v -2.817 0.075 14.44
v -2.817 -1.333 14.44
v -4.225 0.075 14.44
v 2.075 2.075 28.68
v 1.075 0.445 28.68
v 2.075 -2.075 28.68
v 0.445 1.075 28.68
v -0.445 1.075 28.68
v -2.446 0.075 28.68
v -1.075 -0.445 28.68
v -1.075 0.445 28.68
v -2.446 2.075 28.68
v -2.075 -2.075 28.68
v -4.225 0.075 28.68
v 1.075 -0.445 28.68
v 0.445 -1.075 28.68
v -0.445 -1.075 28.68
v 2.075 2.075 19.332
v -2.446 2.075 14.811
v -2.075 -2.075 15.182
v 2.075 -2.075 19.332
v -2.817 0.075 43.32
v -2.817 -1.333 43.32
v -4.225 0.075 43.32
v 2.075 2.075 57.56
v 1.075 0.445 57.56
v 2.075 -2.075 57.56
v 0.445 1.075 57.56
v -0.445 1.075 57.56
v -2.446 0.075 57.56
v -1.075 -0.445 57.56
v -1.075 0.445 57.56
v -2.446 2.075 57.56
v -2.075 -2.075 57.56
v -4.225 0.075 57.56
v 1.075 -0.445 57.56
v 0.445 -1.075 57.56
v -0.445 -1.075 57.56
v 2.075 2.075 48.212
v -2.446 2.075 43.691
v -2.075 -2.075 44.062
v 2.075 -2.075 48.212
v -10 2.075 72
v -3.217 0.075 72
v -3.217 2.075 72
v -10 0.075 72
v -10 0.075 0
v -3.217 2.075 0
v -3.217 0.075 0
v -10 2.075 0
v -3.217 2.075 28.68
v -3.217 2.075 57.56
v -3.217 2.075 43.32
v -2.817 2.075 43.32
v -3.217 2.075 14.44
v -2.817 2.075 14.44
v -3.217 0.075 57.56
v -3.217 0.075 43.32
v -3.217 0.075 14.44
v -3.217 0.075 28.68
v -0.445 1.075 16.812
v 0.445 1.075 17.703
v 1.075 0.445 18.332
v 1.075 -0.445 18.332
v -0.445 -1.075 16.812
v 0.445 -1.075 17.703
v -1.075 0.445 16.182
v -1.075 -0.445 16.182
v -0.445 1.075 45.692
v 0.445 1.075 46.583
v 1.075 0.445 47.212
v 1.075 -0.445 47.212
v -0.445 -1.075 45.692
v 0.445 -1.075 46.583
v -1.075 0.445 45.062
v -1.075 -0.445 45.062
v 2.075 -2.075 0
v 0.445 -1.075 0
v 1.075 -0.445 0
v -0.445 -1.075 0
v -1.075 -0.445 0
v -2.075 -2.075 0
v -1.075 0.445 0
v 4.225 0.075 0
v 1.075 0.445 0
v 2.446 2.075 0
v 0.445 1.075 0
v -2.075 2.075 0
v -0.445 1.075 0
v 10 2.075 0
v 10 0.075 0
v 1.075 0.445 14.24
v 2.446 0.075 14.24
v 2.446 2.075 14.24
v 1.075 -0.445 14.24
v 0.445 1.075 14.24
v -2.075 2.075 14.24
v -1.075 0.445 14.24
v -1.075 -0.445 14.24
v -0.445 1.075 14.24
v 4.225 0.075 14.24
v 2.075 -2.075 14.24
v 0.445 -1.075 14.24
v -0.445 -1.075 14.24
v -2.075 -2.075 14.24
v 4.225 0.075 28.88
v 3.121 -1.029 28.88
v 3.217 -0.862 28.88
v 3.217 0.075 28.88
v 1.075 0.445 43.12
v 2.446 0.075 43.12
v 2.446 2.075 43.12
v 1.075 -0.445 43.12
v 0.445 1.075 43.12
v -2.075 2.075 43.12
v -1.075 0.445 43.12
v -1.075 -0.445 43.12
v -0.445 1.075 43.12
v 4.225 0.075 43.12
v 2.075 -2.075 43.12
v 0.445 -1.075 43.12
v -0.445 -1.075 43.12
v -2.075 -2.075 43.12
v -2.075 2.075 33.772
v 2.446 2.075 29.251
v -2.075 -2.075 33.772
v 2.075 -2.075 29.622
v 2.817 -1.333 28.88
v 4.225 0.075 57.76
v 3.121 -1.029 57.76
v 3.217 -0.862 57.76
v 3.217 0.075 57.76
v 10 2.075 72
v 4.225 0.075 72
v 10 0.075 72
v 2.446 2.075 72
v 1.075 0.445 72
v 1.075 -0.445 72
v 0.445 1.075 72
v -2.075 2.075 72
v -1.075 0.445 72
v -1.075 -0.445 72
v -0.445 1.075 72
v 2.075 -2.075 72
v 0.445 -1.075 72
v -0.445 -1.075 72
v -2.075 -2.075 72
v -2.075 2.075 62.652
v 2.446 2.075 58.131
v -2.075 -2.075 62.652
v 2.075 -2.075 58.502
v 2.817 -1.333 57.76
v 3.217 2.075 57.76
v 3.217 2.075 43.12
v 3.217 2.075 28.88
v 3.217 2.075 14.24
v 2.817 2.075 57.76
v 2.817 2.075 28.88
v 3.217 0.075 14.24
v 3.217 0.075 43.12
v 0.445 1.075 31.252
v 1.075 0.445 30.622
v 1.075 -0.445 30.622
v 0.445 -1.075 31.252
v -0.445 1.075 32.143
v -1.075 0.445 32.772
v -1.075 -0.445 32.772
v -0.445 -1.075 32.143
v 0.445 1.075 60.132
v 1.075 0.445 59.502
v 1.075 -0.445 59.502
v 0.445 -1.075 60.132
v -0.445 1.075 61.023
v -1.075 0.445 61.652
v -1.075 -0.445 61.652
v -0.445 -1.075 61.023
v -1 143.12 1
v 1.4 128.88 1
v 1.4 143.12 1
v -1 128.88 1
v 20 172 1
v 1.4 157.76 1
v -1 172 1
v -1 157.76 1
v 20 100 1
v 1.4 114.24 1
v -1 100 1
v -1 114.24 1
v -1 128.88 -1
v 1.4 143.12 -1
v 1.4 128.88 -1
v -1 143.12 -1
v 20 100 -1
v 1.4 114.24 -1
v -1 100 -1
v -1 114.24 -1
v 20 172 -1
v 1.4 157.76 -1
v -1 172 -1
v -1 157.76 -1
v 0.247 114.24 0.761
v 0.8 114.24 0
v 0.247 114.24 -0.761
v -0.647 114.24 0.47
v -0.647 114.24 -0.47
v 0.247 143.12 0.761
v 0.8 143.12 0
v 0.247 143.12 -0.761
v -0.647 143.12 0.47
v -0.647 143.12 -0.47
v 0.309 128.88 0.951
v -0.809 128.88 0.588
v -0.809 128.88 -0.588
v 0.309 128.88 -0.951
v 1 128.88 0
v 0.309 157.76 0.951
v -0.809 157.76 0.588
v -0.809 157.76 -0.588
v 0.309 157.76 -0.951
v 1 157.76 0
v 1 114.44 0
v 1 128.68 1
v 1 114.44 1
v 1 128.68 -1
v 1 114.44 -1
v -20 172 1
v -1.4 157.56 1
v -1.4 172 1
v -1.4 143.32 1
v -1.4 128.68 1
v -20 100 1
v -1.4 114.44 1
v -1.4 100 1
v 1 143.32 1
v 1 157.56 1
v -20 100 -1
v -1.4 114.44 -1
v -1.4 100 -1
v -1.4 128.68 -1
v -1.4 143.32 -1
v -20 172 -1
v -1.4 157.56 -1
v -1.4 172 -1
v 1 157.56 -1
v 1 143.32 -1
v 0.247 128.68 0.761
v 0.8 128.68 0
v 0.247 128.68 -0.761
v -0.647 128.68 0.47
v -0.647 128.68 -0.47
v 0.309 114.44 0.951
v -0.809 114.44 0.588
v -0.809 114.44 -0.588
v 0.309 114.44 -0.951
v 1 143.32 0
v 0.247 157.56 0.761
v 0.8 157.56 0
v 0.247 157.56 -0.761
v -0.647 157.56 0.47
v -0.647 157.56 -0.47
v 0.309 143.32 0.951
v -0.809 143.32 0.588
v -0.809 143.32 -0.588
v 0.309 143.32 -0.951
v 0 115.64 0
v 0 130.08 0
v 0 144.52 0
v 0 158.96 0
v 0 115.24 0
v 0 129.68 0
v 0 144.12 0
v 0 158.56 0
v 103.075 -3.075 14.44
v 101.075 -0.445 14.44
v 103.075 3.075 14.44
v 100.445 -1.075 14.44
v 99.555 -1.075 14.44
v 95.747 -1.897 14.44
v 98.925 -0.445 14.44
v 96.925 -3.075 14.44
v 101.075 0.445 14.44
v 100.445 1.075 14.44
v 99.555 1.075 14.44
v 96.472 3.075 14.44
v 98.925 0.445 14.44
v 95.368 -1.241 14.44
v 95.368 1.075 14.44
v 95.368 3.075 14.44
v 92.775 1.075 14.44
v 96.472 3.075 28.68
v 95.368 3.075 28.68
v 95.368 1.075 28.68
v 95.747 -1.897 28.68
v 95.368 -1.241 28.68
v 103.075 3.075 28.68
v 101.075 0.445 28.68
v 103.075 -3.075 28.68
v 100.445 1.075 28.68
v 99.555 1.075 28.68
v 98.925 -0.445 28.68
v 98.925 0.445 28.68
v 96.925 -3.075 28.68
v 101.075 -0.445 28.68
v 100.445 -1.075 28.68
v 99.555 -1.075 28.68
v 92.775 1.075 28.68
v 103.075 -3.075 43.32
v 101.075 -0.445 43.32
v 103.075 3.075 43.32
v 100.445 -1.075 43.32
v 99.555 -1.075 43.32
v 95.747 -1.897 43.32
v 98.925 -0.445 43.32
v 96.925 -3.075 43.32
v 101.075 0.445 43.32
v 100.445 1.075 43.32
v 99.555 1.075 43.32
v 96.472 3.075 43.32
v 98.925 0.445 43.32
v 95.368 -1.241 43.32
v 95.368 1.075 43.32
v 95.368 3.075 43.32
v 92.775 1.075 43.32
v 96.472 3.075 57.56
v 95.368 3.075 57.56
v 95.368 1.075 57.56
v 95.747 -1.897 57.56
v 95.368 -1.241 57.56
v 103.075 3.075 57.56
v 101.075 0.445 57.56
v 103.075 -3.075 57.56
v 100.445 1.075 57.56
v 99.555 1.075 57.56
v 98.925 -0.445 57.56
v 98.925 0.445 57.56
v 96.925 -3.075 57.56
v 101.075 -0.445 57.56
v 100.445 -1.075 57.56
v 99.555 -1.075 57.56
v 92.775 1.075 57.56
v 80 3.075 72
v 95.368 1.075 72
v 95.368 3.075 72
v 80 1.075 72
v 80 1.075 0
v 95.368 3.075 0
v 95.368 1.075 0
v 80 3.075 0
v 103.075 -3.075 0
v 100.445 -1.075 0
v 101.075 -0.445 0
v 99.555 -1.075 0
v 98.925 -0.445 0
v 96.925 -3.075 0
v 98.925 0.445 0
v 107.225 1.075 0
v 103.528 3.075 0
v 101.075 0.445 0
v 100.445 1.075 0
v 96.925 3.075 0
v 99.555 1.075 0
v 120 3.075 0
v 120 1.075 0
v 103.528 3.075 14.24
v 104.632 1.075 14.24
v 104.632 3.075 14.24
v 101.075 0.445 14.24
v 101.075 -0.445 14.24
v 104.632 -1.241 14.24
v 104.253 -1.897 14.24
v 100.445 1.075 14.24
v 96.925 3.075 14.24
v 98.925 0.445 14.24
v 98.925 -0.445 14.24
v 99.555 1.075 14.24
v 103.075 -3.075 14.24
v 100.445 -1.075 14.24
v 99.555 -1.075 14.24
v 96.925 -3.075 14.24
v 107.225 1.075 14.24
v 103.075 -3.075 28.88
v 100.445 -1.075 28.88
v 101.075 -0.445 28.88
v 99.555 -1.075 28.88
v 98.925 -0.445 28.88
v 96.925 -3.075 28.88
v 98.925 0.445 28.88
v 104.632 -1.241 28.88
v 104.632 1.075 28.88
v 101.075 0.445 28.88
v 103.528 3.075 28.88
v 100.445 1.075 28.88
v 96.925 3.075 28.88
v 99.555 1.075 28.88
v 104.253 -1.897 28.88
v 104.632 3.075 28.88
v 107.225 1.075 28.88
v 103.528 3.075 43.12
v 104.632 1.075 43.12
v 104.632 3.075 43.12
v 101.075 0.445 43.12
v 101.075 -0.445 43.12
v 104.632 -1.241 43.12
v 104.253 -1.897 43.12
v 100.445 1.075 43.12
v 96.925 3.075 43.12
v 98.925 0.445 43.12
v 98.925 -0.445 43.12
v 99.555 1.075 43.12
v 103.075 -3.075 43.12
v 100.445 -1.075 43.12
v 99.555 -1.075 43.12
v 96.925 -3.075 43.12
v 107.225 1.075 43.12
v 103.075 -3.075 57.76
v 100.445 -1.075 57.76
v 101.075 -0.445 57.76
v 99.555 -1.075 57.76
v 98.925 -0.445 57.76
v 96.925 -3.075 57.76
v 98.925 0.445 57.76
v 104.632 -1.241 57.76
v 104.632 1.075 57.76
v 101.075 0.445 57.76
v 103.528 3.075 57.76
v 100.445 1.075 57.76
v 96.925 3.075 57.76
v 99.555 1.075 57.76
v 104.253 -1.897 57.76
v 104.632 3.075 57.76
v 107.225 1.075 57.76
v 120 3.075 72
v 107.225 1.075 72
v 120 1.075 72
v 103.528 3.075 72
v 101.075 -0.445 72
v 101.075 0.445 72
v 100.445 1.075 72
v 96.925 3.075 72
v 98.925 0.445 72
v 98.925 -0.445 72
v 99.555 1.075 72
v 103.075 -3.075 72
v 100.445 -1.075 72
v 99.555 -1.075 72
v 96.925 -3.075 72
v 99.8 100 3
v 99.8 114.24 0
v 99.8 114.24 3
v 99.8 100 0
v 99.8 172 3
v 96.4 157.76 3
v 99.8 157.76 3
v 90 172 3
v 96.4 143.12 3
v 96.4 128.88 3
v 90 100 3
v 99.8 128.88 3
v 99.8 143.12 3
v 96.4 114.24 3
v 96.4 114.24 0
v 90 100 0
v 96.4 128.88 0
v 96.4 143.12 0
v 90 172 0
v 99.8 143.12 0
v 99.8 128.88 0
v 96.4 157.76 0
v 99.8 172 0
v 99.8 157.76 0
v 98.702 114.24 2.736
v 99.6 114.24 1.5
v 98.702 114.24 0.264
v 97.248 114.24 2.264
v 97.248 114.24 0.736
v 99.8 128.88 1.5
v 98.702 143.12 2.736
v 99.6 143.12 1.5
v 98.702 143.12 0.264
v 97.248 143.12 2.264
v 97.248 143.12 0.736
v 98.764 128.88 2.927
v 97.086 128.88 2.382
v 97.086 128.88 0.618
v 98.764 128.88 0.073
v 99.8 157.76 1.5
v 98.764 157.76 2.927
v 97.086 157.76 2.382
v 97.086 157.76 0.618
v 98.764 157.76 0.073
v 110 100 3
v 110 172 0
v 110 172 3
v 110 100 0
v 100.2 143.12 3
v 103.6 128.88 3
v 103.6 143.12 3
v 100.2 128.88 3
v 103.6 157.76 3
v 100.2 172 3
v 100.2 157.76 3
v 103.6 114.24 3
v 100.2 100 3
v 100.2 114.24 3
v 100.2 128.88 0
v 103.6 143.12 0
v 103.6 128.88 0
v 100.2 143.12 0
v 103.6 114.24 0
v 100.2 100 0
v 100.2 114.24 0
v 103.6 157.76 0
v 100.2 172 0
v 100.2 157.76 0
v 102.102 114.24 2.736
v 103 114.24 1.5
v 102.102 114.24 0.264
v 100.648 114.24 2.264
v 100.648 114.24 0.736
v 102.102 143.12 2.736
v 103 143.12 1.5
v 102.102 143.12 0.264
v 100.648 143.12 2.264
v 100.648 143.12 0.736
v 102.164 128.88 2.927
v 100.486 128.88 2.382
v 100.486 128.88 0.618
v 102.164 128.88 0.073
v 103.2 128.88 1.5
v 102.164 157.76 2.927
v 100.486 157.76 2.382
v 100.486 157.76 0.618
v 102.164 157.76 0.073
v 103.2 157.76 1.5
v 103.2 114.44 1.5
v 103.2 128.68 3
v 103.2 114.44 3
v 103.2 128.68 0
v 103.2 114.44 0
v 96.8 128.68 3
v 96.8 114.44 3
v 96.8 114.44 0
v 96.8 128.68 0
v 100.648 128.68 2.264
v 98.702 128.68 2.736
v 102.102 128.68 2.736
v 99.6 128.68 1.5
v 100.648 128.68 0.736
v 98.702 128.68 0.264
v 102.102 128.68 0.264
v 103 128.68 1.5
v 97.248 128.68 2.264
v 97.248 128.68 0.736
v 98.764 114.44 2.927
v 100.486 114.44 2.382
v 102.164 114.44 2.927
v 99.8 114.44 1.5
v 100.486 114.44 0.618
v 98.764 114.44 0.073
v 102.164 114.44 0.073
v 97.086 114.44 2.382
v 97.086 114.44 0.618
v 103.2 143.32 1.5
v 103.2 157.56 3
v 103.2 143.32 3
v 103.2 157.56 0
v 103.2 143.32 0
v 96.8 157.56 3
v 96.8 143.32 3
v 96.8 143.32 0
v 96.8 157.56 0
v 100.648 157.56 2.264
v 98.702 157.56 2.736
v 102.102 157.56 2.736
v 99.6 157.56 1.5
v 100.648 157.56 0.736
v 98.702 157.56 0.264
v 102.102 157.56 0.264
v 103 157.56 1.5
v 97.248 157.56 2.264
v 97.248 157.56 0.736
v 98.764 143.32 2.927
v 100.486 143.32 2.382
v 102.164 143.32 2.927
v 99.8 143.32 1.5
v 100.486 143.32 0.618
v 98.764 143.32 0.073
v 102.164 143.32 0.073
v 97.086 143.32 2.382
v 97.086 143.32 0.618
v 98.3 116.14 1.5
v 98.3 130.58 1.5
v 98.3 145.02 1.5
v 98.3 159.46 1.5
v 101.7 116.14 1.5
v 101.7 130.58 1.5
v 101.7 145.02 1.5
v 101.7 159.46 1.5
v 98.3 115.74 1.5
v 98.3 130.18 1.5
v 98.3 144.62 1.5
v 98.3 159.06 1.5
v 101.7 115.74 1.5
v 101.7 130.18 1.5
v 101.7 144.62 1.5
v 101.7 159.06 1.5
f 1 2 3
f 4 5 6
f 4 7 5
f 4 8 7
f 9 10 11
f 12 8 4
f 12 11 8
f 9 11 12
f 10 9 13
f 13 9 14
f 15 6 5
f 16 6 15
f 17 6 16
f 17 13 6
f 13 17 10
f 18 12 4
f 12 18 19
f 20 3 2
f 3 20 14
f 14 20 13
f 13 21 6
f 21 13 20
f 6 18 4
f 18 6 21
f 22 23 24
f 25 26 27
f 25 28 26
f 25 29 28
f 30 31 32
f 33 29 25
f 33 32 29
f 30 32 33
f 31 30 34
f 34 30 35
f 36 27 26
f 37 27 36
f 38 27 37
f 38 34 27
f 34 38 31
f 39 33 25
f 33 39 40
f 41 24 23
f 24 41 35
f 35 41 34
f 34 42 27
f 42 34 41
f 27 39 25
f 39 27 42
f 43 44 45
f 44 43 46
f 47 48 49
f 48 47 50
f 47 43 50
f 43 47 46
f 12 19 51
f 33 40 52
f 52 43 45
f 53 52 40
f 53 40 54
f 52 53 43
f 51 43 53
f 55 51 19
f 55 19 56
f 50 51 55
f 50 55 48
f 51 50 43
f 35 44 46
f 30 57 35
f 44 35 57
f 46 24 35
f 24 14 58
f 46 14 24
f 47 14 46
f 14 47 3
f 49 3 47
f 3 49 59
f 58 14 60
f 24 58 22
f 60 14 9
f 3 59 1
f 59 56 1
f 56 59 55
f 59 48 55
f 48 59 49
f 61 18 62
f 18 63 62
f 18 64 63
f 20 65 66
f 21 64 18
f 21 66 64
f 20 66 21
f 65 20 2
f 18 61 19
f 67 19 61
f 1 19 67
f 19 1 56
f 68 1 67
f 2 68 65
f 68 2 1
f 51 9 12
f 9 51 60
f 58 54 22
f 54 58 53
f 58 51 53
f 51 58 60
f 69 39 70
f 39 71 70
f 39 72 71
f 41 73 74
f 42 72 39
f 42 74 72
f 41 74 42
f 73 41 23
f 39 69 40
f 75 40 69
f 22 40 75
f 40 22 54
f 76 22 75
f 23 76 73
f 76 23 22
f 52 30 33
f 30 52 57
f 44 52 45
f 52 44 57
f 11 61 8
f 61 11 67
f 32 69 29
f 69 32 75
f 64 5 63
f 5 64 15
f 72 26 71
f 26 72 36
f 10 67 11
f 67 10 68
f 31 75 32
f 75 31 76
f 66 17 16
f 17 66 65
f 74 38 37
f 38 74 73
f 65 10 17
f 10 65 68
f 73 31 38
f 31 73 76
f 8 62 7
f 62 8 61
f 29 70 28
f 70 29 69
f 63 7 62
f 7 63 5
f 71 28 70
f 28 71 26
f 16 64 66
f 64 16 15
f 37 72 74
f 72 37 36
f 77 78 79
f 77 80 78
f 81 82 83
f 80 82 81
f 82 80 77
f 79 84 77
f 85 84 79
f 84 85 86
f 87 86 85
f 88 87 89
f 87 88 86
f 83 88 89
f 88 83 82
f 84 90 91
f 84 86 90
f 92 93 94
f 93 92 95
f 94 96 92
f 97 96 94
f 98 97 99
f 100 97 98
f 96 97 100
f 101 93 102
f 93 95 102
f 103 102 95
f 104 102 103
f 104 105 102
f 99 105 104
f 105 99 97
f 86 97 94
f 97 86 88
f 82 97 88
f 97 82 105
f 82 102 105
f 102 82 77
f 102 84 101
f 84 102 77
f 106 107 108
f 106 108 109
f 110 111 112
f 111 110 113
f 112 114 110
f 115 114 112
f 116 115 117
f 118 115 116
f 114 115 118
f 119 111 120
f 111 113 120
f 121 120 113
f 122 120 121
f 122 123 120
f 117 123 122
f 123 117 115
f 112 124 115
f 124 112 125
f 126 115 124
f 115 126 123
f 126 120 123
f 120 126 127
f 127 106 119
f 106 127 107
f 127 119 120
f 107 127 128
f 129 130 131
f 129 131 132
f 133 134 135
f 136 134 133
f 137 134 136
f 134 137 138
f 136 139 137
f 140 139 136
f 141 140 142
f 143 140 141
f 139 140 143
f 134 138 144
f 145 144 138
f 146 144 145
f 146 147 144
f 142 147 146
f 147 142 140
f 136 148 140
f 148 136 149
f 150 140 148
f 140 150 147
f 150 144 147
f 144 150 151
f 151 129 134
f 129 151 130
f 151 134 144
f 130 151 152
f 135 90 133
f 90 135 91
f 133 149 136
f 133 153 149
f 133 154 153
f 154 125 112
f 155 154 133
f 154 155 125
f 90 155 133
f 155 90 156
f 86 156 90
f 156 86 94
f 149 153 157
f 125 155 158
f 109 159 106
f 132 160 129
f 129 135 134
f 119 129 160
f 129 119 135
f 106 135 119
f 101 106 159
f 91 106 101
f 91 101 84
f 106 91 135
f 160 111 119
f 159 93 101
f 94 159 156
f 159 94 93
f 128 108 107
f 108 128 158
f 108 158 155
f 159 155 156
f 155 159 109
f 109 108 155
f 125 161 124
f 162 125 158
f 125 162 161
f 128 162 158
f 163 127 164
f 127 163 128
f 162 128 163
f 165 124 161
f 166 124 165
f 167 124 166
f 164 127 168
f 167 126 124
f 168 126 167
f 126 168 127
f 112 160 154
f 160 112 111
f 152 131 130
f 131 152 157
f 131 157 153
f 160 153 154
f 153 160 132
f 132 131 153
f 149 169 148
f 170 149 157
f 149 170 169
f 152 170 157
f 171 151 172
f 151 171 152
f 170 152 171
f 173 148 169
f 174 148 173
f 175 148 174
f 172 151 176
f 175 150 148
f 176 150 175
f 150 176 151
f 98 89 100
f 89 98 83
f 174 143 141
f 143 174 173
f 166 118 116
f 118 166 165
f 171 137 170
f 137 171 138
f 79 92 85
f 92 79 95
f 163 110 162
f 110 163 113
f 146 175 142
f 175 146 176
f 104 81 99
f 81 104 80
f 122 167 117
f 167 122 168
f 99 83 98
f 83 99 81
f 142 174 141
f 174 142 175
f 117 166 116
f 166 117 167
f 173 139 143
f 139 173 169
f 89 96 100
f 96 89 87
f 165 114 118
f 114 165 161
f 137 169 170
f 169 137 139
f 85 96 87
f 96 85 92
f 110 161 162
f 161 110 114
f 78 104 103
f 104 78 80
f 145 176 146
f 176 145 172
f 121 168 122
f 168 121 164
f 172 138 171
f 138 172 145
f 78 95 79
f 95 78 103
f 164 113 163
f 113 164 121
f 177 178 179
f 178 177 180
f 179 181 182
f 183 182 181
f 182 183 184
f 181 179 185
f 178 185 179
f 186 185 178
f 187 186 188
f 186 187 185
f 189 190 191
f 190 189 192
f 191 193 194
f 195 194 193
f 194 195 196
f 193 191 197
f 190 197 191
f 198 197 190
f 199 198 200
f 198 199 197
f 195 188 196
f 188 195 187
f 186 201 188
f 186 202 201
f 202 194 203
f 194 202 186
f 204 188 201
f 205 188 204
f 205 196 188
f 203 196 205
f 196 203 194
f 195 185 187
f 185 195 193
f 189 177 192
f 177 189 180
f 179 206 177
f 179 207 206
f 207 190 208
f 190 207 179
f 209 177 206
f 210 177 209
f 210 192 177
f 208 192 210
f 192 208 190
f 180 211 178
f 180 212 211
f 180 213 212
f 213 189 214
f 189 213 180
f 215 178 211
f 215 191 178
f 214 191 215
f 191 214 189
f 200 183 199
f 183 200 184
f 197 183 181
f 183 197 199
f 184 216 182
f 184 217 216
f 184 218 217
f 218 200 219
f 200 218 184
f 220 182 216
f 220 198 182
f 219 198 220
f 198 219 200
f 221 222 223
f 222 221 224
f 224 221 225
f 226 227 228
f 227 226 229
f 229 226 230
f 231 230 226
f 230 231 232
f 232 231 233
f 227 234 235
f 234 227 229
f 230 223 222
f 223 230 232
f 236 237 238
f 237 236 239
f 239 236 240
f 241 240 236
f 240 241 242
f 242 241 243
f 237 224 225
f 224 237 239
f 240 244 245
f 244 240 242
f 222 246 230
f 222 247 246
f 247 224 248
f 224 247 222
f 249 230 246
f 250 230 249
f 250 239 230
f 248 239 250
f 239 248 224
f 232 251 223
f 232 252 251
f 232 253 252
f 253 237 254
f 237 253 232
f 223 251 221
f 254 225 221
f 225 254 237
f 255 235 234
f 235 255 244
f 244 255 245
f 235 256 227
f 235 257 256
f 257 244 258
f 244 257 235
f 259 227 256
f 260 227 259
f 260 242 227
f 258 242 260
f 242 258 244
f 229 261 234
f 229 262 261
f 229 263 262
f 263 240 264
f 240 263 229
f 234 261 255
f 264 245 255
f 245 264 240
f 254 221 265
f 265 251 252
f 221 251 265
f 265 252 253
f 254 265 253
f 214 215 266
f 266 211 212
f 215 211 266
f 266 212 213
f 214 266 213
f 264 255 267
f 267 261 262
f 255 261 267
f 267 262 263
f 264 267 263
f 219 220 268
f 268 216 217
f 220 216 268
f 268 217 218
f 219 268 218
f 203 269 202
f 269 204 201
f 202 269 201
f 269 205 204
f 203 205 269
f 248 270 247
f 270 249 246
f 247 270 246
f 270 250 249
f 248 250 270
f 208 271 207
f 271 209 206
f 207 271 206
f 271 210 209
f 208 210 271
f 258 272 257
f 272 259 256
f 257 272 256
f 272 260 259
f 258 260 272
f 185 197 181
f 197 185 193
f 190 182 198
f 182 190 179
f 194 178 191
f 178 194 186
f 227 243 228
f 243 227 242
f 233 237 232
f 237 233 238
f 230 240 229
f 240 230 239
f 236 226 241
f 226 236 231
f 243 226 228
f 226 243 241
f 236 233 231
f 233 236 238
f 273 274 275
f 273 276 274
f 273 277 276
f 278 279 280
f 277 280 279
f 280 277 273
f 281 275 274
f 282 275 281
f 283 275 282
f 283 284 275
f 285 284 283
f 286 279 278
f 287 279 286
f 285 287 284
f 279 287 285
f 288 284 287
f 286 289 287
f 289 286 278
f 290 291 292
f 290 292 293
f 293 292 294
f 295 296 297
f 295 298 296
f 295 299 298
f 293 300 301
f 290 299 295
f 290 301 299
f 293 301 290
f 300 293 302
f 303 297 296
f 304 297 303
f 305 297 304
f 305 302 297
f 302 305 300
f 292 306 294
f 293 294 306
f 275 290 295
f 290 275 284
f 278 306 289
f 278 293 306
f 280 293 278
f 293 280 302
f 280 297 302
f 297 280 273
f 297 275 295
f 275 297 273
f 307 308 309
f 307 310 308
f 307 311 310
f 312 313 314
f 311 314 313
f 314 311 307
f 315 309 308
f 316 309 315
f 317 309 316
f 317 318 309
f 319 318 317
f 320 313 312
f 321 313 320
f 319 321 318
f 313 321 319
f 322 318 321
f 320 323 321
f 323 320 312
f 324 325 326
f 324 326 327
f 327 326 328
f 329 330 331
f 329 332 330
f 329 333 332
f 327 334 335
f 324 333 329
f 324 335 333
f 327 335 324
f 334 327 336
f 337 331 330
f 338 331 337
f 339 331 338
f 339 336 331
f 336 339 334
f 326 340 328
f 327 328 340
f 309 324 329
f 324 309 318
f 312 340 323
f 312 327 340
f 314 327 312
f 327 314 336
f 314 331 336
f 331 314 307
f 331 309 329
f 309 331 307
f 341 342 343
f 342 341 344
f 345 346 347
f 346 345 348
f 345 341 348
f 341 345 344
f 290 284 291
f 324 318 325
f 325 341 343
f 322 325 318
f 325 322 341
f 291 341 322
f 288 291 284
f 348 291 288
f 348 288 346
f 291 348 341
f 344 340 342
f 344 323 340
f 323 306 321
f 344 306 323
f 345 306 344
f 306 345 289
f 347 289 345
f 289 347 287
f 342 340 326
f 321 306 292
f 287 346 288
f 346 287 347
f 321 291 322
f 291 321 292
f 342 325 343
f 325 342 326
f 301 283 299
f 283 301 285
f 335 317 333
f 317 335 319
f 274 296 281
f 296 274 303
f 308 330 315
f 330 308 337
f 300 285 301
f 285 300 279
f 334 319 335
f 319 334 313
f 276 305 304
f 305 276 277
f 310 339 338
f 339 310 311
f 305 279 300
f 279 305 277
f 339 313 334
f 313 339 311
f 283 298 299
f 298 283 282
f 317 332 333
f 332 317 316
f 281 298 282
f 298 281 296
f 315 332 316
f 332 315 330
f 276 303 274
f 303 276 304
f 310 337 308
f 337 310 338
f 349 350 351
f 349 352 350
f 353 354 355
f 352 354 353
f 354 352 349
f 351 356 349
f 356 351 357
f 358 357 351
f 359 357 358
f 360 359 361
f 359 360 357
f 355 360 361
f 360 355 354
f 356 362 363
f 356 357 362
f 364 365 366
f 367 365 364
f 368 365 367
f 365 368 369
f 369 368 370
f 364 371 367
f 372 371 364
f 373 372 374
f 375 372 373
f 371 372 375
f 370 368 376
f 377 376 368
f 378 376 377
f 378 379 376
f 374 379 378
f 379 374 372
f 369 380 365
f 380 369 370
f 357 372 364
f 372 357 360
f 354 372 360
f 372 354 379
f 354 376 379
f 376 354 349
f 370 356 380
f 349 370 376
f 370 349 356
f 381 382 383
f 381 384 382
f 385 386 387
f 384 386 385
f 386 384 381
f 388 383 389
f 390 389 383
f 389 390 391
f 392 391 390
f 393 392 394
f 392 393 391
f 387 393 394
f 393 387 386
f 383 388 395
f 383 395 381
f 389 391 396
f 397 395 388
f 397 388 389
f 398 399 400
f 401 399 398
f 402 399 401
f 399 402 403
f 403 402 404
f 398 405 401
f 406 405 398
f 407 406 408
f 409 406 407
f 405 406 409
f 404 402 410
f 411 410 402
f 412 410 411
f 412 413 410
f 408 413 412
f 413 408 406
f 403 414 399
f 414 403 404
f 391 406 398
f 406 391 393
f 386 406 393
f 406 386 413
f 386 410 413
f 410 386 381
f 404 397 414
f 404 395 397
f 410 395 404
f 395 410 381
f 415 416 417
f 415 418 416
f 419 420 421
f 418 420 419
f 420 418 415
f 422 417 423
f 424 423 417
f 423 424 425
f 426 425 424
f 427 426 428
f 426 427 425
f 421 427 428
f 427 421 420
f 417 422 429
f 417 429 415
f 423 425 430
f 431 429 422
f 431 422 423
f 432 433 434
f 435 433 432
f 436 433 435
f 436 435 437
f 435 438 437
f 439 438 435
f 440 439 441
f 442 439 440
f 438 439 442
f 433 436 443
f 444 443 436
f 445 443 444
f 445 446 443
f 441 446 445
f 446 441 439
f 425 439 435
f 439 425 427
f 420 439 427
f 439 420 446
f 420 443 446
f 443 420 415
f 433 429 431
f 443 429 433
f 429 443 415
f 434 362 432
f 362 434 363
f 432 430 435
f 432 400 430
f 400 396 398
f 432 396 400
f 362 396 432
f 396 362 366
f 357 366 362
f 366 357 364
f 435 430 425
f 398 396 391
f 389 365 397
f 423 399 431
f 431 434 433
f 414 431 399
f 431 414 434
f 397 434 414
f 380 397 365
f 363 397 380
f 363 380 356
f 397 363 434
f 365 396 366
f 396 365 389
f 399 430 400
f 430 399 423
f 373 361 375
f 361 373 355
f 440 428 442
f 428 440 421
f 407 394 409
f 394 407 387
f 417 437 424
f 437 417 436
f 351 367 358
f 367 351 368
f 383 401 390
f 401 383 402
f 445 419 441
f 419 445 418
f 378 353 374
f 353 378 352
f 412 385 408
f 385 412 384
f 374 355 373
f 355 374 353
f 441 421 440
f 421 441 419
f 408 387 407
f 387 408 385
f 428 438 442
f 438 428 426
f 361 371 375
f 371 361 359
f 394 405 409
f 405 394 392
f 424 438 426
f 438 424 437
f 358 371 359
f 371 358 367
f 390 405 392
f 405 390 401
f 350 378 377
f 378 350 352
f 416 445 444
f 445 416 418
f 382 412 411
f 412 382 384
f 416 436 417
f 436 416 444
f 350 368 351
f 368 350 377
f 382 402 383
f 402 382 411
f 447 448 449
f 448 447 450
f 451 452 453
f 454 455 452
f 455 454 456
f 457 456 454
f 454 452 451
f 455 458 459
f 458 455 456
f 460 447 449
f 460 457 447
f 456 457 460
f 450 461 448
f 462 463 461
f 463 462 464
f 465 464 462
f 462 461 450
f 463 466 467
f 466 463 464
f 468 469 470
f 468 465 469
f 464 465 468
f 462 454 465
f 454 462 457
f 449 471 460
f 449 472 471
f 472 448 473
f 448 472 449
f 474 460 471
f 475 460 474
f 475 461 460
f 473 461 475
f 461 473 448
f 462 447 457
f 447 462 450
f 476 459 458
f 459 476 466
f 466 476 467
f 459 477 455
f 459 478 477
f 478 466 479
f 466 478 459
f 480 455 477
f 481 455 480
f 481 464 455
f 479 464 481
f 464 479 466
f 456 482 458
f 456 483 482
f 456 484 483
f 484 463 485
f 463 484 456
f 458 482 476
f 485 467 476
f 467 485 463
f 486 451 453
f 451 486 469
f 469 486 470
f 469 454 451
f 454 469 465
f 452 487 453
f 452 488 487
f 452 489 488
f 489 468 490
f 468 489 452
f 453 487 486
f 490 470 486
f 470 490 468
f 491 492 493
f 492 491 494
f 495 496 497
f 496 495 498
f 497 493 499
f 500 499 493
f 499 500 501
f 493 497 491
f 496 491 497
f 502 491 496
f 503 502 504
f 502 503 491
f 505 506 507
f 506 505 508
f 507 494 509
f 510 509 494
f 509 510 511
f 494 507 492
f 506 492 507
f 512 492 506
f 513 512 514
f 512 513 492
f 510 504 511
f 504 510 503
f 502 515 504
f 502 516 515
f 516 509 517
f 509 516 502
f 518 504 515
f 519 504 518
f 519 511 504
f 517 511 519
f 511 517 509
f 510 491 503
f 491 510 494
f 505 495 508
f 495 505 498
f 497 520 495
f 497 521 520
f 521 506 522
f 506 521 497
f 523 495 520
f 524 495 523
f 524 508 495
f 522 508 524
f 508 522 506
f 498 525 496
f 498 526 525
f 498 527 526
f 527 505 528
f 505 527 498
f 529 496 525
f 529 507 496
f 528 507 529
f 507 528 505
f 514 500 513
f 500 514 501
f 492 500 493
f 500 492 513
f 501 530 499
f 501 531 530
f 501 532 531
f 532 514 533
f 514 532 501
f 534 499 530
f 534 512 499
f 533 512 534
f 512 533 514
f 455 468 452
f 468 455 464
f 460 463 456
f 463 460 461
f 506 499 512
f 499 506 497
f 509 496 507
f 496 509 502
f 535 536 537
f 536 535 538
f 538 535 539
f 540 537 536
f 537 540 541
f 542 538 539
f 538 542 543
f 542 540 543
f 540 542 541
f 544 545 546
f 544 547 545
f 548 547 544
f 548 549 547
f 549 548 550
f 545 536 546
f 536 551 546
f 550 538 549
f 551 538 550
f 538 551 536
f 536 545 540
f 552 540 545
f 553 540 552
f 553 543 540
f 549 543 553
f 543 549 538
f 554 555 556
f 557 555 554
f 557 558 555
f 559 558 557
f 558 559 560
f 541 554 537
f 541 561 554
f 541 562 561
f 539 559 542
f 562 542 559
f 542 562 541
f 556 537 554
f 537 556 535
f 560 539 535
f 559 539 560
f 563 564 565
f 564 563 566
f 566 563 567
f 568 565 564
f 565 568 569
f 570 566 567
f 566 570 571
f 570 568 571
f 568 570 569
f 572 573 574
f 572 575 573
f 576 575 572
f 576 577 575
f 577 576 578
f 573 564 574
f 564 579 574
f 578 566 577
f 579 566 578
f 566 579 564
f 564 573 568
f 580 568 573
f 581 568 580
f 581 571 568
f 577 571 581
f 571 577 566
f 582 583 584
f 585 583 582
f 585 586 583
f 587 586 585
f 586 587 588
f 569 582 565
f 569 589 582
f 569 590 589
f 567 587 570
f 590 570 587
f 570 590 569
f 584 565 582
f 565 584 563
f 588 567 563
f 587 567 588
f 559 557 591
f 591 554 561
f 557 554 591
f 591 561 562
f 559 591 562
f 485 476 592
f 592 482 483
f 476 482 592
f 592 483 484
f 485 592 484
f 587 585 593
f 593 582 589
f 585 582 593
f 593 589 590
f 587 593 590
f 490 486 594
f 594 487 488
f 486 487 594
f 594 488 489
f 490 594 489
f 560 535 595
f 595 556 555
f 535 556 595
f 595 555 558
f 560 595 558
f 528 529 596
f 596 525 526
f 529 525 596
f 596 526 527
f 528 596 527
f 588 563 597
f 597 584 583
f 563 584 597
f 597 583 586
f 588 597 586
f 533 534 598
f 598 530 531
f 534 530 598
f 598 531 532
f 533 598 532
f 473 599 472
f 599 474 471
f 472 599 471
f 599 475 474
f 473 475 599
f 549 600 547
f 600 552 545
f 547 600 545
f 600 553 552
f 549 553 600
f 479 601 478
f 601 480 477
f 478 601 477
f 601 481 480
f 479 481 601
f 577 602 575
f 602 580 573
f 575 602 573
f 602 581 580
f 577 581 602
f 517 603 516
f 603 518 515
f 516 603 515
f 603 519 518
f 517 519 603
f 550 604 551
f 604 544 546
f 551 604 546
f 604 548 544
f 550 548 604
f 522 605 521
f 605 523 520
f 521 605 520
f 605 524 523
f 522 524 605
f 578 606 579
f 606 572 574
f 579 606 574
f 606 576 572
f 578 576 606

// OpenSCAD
// file: default.scad
function default(val, def) = is_undef(val) ? def : val;
function assert_defined(name, val) = assert(!is_undef(val), str(name, " not defined")) val;
function count_defined(a, n)
    = is_undef(n)
        ? count_defined(a, len(a))
        : assert(n >= 0) n == 0
            ? 0
            : count_defined(a, n-1)
                + (is_undef(a[n-1]) ? 0 : 1);

assert(count_defined([]) == 0);
assert(count_defined([0]) == 1);
assert(count_defined([undef, 0]) == 1);
assert(count_defined([0, undef]) == 1);
assert(count_defined([0, false]) == 2);
// file: selection.scad
// Display all of the models in a grid or, if only one is selected,
// leave it at the origin.
module contents(d=100) {
    nx = ceil(sqrt($children));
    ny = ceil($children/nx);
    for (xi=[0:nx-1], yi=[0:ny-1]) {
        i = xi + yi*nx;
        if (i < $children) {
            if (is_undef($content_selected)
                || $content_selected == "all") {
                translate([xi*d, yi*d, 0]) children(i);
            } else {
                children(i);
            }
        }
    }
}

// Render or describe a particular item.
// In normal mode, render the children if this item is selected, or if
// rendering all items.
// In inventory mode, describe the item.
//
// name - item's name
// png - generate a PNG of this item
// stl - generate a STL of this item
// distance, xrot, zrot, z - camera parameters for PNG
module item(name, png=true, stl=true, distance, xrot, zrot, z) {
    if (is_undef($content_inventory)) {
        if (is_undef($content_selected)
            || $content_selected == "all"
            || $content_selected == name) {
                children();
        }
    } else {
        _distance = default(distance, 150);
        _zrot = default(zrot, 30);
        _xrot = default(xrot, 60);
        _z = default(z, 15);
        camera = is_undef(distance) && is_undef(zrot) && is_undef(z) && is_undef(xrot)
            ? "--viewall"
            : str("--camera 0,0,", _z, ",", _xrot, ",0,", _zrot, ",", _distance);
        if ($content_inventory == "all")
            echo("PART", name);
        else if ($content_inventory == "png" && png)
            echo("PART", name, camera);
        else if ($content_inventory == "stl" && stl)
            echo("PART", name);
    }
}

// Render part p of the model if rendering all, or if it's selected.
module ifpart(p) {
    if (is_undef($part) || $part == "all" || $part == p) {
        children();
    }
}

// Render part p of the model only if it's specifically selected.
module ifpartonly(p) {
    if (!is_undef($part) && $part == p) {
        children();
    }
}

// Render the children only if all parts are selected.
module ifpartall() {
    if (is_undef($part) || $part == "all") {
        children();
    }
}

// Render the children if this variation is selected.
// This is really the same as a vanilla "if", but makes
// the intent a little clearer.
module ifvariation(selector, v) {
    if (selector == v) {
        children();
    }
}
// file: justify.scad
use <default.scad>

// @brief       Given an [x,y] or an [x,y,z], return an [x,y,z].
// @param   a   A two- or three- element array
// @returns     A three-element array
function make3(a) =
    assert(len(a) == 2 || len(a) == 3)
    len(a) == 3 ? a : concat(a, 0);
    
// @brief       Given an [x,y] or an [x,y,z], return an [x,y],
//              discarding z.
// @param   a   A two- or three- element array
// @returns     A two-element array
function make2(a) =
    assert(len(a) == 2 || len(a) == 3)
    [ a[0], a[1] ];
    
// @brief        Justify children as specified by argument.
// @param center Equivalent to justify=[0,0,0].
// @param j      [jx,jy,jz]:
//                   +1 toward-positive
//                    0 center
//                   -1 toward-negative
// @param bb     Bounding box:
//                   [dimx,dimy,dimz]
//                   [ [ox,oy,oz], [dimx,dimy,dimz] ]
// @children     Object(s) to be justified.
// @note Works for two- or three- dimensional objects.
// @note If more than one object is supplied as a child, they
//       are all justified en mass with respect to the specified
//       bounding box.
module justify(center, j, bb) {
    origin = make3(
        assert(is_list(bb))
        is_list(bb[0])
            ? assert(len(bb) == 2) bb[0]
            : [0,0,0]
    );
    dims = make3(
            is_list(bb[0])
                ? bb[1]
                : bb
    );
    j = make3(default(j, center ? [0,0,0] : [1,1,1]));
    function o(flag, dim) = flag > 0 ? 0 :
        flag < 0 ? -dim :
        -dim/2;
    translate([o(j[0], dims[0]),
        o(j[1], dims[1]),
        o(j[2], dims[2])])
        translate(-origin)  // Move BB minima to [0,0,0]
        children();
}


// @brief        A justified cube
// @param dims   Dimensions of the cube
// @param center Equivalent to j=[0,0,0]
// @param j      As for justify() above
module jcube(dims, center, j) {
    justify(center=center, j=j, bb=dims) cube(dims);
}

module jsquare(dims, center, j) {
    justify(center=center, j=j, bb=dims) square(dims);
}

// OpenSCAD polygons have their radius/diameter
// measured to the vertices.  These functions
// give you the OD given the ID, and vice versa.
function poly_i_to_o(r, n) = r / cos(360/n/2);
function poly_o_to_i(r, n) = r * cos(360/n/2);

function _jcircle_assert_args(name, d, r, id, od, ir, or, d1, r1, id1, ir1, od1, or1) =
    let (c = count_defined([d, r, id, od, ir, or, d1, r1, id1, ir1, od1, or1]))
    assert(c > 0, str(name, ": no parameters"))
    assert(c < 2, str(name, ": too many parameters"))
    undef;

function _jcircle_diameter(name, fn, d, r, id, od, ir, or, d1, r1, id1, ir1, od1, or1)
        = let(junk=_jcircle_assert_args(name=name, d=d, r=r, id=id, od=od, ir=ir, or=or, d1=d1, r1=r1, id1=id1, ir1=ir1, od1=od1, or1=or1))
        !is_undef(od1) ? od1
        : !is_undef(id1) ? poly_i_to_o(id1, fn)
        : !is_undef(or1) ? or1*2
        : !is_undef(ir1) ? poly_i_to_o(ir1, fn)*2
        : !is_undef(d1) ? d1
        : !is_undef(r1) ? r1*2
        : !is_undef(od) ? od
        : !is_undef(id) ? poly_i_to_o(id, fn)
        : !is_undef(or) ? or*2
        : !is_undef(ir) ? poly_i_to_o(ir, fn)*2
        : !is_undef(d) ? d
        : !is_undef(r) ? r*2
        : undef;

// NEEDSWORK needs a j parameter, but note that the j parameter does
// not behave like a normal j.  j=0 needs to put the origin on the center of
// the circle, not on the midpoint of the bounding box.  The two are in
// different places when the number of sides is odd.
// With fn = n*4+2, the top and bottom faces are horizontal, and the left and right sides are vertices.  (Or the other way around, depending on rotation.)  Need to figure out which, and how justification interacts.
module jcircle(d, r, id, od, ir, or, j) {
    fn = !$fn ? 60 : $fn;
    d = _jcircle_diameter(name="d", fn=fn, d=d, r=r, id=id, od=od, ir=ir, or=or);
    vertex_mode = !is_undef(or) || !is_undef(od);
    rotate(vertex_mode ? 0 : 360/$fn/2) circle(d=d);
}

module jcylinder(h, d, r, id, od, ir, or, d1, d2, r1, r2, id1, id2, ir1, ir2, od1, od2, or1, or2, j) {
    fn = !$fn ? 60 : $fn;
    d1 = _jcircle_diameter(name="d1", fn=fn, d=d, r=r, id=id, od=od, ir=ir, or=or, d1=d1, r1=r1, id1=id1, ir1=ir1, od1=od1, or1=or1);
    d2 = _jcircle_diameter(name="d2", fn=fn, d=d, r=r, id=id, od=od, ir=ir, or=or, d1=d2, r1=r2, id1=id2, ir1=ir2, od1=od2, or1=or2);
    rotate([0,0,360/fn/2]) cylinder(h=h, d1=d1, d2=d2, $fn=fn);
}
// NEEDSWORK with odd (or non-multiple-of-4?) sides justification is
// not symmetrical.
// NEEDSWORK with $fn undefined you need the dimensions to derive it.
!jcylinder(h=10, od=10, $fn=6);

// Test/demos
for (xj=[-1:1], yj=[-1:1], zj=[-1:1]) {
    justify(j=[xj,yj,zj], bb=[[-10,-10,-10],[20,20,20]])
        color([(xj+1)/2, (yj+1)/2, (zj+1)/2]) sphere(r=10);
}

translate([30,0]) for (xj=[-1:1], yj=[-1:1]) {
    justify(j=[xj,yj], bb=[[-10,-10],[10,10]])
        color([(xj+1)/2, (yj+1)/2, 0]) circle(r=10);
}
// main file
use <justify.scad>
use <selection.scad>
use <default.scad>

$content_selected = "all"; // [all, filament-1, filament-2, flat, double ]
length=72;
nseg=5; // [3:2:11]
a=0;    // [-180:10:180]

contents() {
    item("filament-1") {
        difference() {
            hinge_filament(length=length, nseg=nseg, a=a, w=20, plate_t=2, corner=false, cut=false, vertical=true, $part="inner");
            hinge_filament(length=length, nseg=nseg, a=a, w=20, plate_t=2, corner=false, cut=true, vertical=true, $part="outer");
        }

        difference() {
            hinge_filament(length=length, nseg=nseg, a=a, w=20, plate_t=2, corner=false, cut=false, vertical=true, $part="outer");
            hinge_filament(length=length, nseg=nseg, a=a, w=20, plate_t=2, corner=false, cut=true, vertical=true, $part="inner");
        }
    }
    item("filament-2") {
        plate_t = 2;
        hinge_t = 2;
        w = 40;
        difference() {
            hinge_filament(length=length, nseg=nseg, a=a, w=w, plate_t=plate_t, hinge_t=hinge_t, corner=false, cut=false, vertical=false, $part="inner");
            hinge_filament(length=length, nseg=nseg, a=a, w=w, plate_t=plate_t, hinge_t=hinge_t, corner=false, cut=true, vertical=false, $part="outer");
        }

        difference() {
            hinge_filament(length=length, nseg=nseg, a=a, w=w, plate_t=plate_t, hinge_t=hinge_t, corner=false, cut=false, vertical=false, $part="outer");
            hinge_filament(length=length, nseg=nseg, a=a, w=w, plate_t=plate_t, hinge_t=hinge_t, corner=false, cut=true, vertical=false, $part="inner");
        }
    }
    item("flat") hinge_flat(h=length, w=20, t=2, nseg=nseg, a=a);
    item("double") hinge_flat_double(h=length, w=10, t=3, nseg=nseg, a=a);
}

// A hinge that uses a piece of filament as a hinge pin.
//
// length - total length of the hinge
// w - total width of the hinge (both sides)
// a - angle between two sides
// nseg - number of segments (odd is best because then you can glue both ends)
// hinge_t - thickness of hinge barrel
// plate_t - thickness of plate (the section that mates to the model)
// fd - filament diameter
// gap - gap between parts and between filament and hinge
// corner - true to set origin to the point where the hinge planes intersect
// cut - true to select the negative object to cut away from the model for
//     hinge clearance.
// pos2 - vec2 of z-start and z-length of plate section
// vertical - true to apply a diagonal cut to make the hinge maybe be printable
//     vertically.  (Not tested in real printing!)
// $part - "outer" to select the odd-numbered segments, "inner" to select the
//     even-numbered segments.  (The names make sense if there's an odd number
//     of segments, but not if there's an even number.)
module hinge_filament(length, w=20, a=0, nseg=5, hinge_t=1, plate_t=1, fd=1.75, gap=0.2, corner=false, cut=false, pos2, vertical=false) {
    module hole_circle() {
        jcircle(id = (fd+gap*2), $fn=8);
    }
    module seg(i, s) {
        fn = cut ? 12 : 4;
        seg_h = cut ? seglen + 2*gap : seglen;
        cut_d = poly_i_to_o(d + 2*gap, 4);
        seg_d = cut ? cut_d : d;
        origin = cut ? [0,0,-gap] : [0,0,0];
        translate(origin+[0,0,(i-1)*(seglen+gap)]) {
            linear_extrude(height=seg_h, convexity=10) {
                difference() {
                    union() {
                        jcircle(id=seg_d, $fn=fn);
                        polygon([
                            [0, -seg_d/2],
                            [s*seg_d/2, -seg_d/2],
                            [s*(seg_d/2+seg_d), seg_d/2],
                            [-s*seg_d/2, seg_d/2],
                            [-s*seg_d/2, 0]
                        ]);
                    }
                    if (!cut) {
                        hole_circle();
                    }
                }
            }
            if (vertical && cut) {
                translate([0,0,seglen]) rotate(0)
                    vertical_printability_cut(s, d, cut_d);
            }
        }
    }
    module plate(s, pos) {
        pos = default(pos, [0, length]);
        or = poly_i_to_o(d, 8)/2;
        translate([s*(or+gap), d/2, pos[0]])
            jcube([w/2 - (or+gap), plate_t, pos[1]], j=[s, -1, 1]);
    }
    module vertical_printability_cut(s, d, cut_d) {
        rotate([90,0,90+s*90]) linear_extrude(height=d*3, center=true) {
            translate([-cut_d/2,0,0]) polygon([
                [0,0],
                [cut_d, 0],
                [0, cut_d]
            ]);
        }
    }
    module segs(start, s, pos) {
        for (i = [start:2:nseg]) {
            seg(i, s);
        }
        if (cut) {
            // NEEDSWORK is this necessary, given the hole_circle()
            // above?  Or maybe that's not necessary?
            hole();
        } else {
            plate(s, pos);
        }
    }
    module outer() {
        segs(1, 1);
    }
    module inner() {
        segs(2, -1, pos=pos2);
    }
    module hole() {
        translate([0,0,-1]) {
            linear_extrude(height=length+2) hole_circle();
        }
    }
    
    seglen = (length - gap*(nseg-1)) / nseg;
    d = fd + 2*(gap+hinge_t);

    if (corner) {
        assert(a < 180);
    }

    origin = corner ? [d/2*tan(a/2),-d/2,0]
        : [ 0,0,0 ];
    
    translate(origin) {
        ifpart("outer") {
            rotate(cut ? a : 0) /*color("red")*/ outer();
        }
        ifpart("inner") {
            rotate(cut ? 0 : a) {
                /*color("blue")*/ inner();
            }
        }
        ifpartonly("hole") color("black") {
            hole();
        }
    }
}

// A simple flat print-in-place hinge that uses cones for hinge pins
//
// h - total height of the hinge
// w - width of each side of the hinge
// t - thickness of the hinge
// overlap - amount that the two sides overlap in the middle
// xgap - gap between the two sides in X
// ygap - gap between the two sides in Y
// nseg - number of segments
// pin_h - height of the pin cones
// pin_gap gap between the pin cone and the hollow it fits into
// pin_t - diameter of the base of the pin cones
module hinge_flat(h, w, t, overlap, xgap=0.4, ygap=0.2, nseg=3, pin_h, pin_gap=0.2, pin_t, a=0) {
    overlap = default(overlap, t);
    pin_h = default(pin_h, t/2);
    pin_t = default(pin_t, t-pin_gap*2);

    seglen = (h - (nseg-1)*ygap)/nseg;

    difference() {
        union() {
            // Fingers from +X that extend into -X
            for (i = [1:2:nseg]) {
                translate([-overlap/2,(i-1)*(seglen+ygap),0])
                    jcube([w, seglen, t], j=[1,1,0]);
            }
            // Fingers from -X that extend into +X
            rotate([0,a,0]) for (i = [2:2:nseg]) {
                translate([overlap/2, (i-1)*(seglen+ygap), 0])
                    jcube([w, seglen, t], j=[-1,1,0]);
            }
        }
        // hollows for the pins
        for (i=[2:nseg]) {
            translate([0, (i-1)*(seglen+ygap), 0])
                rotate([-90,0,0]) cylinder(h=pin_h+pin_gap, d1=pin_t+pin_gap*2, d2=0);
        }
    }

    // +X plate
    translate([overlap/2+xgap, 0,0])
        jcube([w-overlap/2-xgap, h, t], j=[1,1,0]);
    // -X plate
    rotate([0,a,0]) translate([-overlap/2-xgap, 0, 0])
        jcube([w-overlap/2-xgap, h, t], j=[-1,1,0]);

    // Pins
    for (i = [1:nseg-1]) {
        translate([0, seglen + (i-1)*(seglen+ygap), 0]) {
            rotate([-90,0,0]) cylinder(h=pin_h, d1=pin_t, d2=0);
        }
    }
}

// A double print-in-place hinge (can be folded all the way to 180 degrees).
// Uses cones for pins.
//
// h - total height of the hinge
// w - width of each side of the hinge
// t - thickness of the hinge
// overlap - amount that the sides overlap with the middle pieces
// xgap - gap between the two sides in X
// ygap - gap between the two sides in Y
// nseg - number of segments (must be odd)
// pin_h - height of the pin cones
// pin_gap gap between the pin cone and the hollow it fits into
// pin_t - diameter of the base of the pin cones
// middle - gap between the sides when folded to 180 degrees
module hinge_flat_double(h, w, t, overlap, xgap=0.4, ygap=0.2, nseg=3, pin_h, pin_gap=0.2, pin_t, middle=0.4, a=0) {
    assert(nseg > 2);
    assert(nseg%2 == 1, "nseg must be odd");

    overlap = default(overlap, t);
    pin_h = default(pin_h, t/2);
    pin_t = default(pin_t, t-pin_gap*2);

    seglen = (h - (nseg-1)*ygap)/nseg;

    difference() {
        union() {
            // for each side
            for (s = [-1,1]) {
                // Fingers that extend to the middle
                for (i = [1:2:nseg]) {
                    dx = xgap/2;
                    translate([s*dx,(i-1)*(seglen+ygap),0])
                        jcube([w-dx, seglen, t], j=[s,1,1]);
                }
                // Plate.  (Union is just for variable scoping, and
                // to have a consistent pattern.)
                union () {
                    dx = middle/2 + overlap + xgap;
                    translate([s*dx, 0, 0])
                        jcube([w-dx, h, t], j=[s,1,1]);
                }
            }
            // Floating pieces in the middle
            for (i = [2:2:nseg]) {
                translate([0, (i-1)*(seglen+ygap), 0])
                    jcube([overlap+middle+overlap, seglen, t], j=[0,1,1]);
            }
        }
        // Hollows for the pins
        for (s=[-1,1], i=[2:nseg]) {
            dx = middle/2 + overlap/2;
            translate([s*dx, (i-1)*(seglen+ygap), t/2])
                rotate([-90,0,0]) cylinder(h=pin_h+pin_gap, d1=pin_t+pin_gap*2, d2=0);
        }
    }

    // Pins
    for (s=[-1,1], i = [1:nseg-1]) {
        dx = middle/2 + overlap/2;
        translate([s*dx, seglen + (i-1)*(seglen+ygap), t/2]) {
            rotate([-90,0,0]) cylinder(h=pin_h, d1=pin_t, d2=0);
        }
    }
}
